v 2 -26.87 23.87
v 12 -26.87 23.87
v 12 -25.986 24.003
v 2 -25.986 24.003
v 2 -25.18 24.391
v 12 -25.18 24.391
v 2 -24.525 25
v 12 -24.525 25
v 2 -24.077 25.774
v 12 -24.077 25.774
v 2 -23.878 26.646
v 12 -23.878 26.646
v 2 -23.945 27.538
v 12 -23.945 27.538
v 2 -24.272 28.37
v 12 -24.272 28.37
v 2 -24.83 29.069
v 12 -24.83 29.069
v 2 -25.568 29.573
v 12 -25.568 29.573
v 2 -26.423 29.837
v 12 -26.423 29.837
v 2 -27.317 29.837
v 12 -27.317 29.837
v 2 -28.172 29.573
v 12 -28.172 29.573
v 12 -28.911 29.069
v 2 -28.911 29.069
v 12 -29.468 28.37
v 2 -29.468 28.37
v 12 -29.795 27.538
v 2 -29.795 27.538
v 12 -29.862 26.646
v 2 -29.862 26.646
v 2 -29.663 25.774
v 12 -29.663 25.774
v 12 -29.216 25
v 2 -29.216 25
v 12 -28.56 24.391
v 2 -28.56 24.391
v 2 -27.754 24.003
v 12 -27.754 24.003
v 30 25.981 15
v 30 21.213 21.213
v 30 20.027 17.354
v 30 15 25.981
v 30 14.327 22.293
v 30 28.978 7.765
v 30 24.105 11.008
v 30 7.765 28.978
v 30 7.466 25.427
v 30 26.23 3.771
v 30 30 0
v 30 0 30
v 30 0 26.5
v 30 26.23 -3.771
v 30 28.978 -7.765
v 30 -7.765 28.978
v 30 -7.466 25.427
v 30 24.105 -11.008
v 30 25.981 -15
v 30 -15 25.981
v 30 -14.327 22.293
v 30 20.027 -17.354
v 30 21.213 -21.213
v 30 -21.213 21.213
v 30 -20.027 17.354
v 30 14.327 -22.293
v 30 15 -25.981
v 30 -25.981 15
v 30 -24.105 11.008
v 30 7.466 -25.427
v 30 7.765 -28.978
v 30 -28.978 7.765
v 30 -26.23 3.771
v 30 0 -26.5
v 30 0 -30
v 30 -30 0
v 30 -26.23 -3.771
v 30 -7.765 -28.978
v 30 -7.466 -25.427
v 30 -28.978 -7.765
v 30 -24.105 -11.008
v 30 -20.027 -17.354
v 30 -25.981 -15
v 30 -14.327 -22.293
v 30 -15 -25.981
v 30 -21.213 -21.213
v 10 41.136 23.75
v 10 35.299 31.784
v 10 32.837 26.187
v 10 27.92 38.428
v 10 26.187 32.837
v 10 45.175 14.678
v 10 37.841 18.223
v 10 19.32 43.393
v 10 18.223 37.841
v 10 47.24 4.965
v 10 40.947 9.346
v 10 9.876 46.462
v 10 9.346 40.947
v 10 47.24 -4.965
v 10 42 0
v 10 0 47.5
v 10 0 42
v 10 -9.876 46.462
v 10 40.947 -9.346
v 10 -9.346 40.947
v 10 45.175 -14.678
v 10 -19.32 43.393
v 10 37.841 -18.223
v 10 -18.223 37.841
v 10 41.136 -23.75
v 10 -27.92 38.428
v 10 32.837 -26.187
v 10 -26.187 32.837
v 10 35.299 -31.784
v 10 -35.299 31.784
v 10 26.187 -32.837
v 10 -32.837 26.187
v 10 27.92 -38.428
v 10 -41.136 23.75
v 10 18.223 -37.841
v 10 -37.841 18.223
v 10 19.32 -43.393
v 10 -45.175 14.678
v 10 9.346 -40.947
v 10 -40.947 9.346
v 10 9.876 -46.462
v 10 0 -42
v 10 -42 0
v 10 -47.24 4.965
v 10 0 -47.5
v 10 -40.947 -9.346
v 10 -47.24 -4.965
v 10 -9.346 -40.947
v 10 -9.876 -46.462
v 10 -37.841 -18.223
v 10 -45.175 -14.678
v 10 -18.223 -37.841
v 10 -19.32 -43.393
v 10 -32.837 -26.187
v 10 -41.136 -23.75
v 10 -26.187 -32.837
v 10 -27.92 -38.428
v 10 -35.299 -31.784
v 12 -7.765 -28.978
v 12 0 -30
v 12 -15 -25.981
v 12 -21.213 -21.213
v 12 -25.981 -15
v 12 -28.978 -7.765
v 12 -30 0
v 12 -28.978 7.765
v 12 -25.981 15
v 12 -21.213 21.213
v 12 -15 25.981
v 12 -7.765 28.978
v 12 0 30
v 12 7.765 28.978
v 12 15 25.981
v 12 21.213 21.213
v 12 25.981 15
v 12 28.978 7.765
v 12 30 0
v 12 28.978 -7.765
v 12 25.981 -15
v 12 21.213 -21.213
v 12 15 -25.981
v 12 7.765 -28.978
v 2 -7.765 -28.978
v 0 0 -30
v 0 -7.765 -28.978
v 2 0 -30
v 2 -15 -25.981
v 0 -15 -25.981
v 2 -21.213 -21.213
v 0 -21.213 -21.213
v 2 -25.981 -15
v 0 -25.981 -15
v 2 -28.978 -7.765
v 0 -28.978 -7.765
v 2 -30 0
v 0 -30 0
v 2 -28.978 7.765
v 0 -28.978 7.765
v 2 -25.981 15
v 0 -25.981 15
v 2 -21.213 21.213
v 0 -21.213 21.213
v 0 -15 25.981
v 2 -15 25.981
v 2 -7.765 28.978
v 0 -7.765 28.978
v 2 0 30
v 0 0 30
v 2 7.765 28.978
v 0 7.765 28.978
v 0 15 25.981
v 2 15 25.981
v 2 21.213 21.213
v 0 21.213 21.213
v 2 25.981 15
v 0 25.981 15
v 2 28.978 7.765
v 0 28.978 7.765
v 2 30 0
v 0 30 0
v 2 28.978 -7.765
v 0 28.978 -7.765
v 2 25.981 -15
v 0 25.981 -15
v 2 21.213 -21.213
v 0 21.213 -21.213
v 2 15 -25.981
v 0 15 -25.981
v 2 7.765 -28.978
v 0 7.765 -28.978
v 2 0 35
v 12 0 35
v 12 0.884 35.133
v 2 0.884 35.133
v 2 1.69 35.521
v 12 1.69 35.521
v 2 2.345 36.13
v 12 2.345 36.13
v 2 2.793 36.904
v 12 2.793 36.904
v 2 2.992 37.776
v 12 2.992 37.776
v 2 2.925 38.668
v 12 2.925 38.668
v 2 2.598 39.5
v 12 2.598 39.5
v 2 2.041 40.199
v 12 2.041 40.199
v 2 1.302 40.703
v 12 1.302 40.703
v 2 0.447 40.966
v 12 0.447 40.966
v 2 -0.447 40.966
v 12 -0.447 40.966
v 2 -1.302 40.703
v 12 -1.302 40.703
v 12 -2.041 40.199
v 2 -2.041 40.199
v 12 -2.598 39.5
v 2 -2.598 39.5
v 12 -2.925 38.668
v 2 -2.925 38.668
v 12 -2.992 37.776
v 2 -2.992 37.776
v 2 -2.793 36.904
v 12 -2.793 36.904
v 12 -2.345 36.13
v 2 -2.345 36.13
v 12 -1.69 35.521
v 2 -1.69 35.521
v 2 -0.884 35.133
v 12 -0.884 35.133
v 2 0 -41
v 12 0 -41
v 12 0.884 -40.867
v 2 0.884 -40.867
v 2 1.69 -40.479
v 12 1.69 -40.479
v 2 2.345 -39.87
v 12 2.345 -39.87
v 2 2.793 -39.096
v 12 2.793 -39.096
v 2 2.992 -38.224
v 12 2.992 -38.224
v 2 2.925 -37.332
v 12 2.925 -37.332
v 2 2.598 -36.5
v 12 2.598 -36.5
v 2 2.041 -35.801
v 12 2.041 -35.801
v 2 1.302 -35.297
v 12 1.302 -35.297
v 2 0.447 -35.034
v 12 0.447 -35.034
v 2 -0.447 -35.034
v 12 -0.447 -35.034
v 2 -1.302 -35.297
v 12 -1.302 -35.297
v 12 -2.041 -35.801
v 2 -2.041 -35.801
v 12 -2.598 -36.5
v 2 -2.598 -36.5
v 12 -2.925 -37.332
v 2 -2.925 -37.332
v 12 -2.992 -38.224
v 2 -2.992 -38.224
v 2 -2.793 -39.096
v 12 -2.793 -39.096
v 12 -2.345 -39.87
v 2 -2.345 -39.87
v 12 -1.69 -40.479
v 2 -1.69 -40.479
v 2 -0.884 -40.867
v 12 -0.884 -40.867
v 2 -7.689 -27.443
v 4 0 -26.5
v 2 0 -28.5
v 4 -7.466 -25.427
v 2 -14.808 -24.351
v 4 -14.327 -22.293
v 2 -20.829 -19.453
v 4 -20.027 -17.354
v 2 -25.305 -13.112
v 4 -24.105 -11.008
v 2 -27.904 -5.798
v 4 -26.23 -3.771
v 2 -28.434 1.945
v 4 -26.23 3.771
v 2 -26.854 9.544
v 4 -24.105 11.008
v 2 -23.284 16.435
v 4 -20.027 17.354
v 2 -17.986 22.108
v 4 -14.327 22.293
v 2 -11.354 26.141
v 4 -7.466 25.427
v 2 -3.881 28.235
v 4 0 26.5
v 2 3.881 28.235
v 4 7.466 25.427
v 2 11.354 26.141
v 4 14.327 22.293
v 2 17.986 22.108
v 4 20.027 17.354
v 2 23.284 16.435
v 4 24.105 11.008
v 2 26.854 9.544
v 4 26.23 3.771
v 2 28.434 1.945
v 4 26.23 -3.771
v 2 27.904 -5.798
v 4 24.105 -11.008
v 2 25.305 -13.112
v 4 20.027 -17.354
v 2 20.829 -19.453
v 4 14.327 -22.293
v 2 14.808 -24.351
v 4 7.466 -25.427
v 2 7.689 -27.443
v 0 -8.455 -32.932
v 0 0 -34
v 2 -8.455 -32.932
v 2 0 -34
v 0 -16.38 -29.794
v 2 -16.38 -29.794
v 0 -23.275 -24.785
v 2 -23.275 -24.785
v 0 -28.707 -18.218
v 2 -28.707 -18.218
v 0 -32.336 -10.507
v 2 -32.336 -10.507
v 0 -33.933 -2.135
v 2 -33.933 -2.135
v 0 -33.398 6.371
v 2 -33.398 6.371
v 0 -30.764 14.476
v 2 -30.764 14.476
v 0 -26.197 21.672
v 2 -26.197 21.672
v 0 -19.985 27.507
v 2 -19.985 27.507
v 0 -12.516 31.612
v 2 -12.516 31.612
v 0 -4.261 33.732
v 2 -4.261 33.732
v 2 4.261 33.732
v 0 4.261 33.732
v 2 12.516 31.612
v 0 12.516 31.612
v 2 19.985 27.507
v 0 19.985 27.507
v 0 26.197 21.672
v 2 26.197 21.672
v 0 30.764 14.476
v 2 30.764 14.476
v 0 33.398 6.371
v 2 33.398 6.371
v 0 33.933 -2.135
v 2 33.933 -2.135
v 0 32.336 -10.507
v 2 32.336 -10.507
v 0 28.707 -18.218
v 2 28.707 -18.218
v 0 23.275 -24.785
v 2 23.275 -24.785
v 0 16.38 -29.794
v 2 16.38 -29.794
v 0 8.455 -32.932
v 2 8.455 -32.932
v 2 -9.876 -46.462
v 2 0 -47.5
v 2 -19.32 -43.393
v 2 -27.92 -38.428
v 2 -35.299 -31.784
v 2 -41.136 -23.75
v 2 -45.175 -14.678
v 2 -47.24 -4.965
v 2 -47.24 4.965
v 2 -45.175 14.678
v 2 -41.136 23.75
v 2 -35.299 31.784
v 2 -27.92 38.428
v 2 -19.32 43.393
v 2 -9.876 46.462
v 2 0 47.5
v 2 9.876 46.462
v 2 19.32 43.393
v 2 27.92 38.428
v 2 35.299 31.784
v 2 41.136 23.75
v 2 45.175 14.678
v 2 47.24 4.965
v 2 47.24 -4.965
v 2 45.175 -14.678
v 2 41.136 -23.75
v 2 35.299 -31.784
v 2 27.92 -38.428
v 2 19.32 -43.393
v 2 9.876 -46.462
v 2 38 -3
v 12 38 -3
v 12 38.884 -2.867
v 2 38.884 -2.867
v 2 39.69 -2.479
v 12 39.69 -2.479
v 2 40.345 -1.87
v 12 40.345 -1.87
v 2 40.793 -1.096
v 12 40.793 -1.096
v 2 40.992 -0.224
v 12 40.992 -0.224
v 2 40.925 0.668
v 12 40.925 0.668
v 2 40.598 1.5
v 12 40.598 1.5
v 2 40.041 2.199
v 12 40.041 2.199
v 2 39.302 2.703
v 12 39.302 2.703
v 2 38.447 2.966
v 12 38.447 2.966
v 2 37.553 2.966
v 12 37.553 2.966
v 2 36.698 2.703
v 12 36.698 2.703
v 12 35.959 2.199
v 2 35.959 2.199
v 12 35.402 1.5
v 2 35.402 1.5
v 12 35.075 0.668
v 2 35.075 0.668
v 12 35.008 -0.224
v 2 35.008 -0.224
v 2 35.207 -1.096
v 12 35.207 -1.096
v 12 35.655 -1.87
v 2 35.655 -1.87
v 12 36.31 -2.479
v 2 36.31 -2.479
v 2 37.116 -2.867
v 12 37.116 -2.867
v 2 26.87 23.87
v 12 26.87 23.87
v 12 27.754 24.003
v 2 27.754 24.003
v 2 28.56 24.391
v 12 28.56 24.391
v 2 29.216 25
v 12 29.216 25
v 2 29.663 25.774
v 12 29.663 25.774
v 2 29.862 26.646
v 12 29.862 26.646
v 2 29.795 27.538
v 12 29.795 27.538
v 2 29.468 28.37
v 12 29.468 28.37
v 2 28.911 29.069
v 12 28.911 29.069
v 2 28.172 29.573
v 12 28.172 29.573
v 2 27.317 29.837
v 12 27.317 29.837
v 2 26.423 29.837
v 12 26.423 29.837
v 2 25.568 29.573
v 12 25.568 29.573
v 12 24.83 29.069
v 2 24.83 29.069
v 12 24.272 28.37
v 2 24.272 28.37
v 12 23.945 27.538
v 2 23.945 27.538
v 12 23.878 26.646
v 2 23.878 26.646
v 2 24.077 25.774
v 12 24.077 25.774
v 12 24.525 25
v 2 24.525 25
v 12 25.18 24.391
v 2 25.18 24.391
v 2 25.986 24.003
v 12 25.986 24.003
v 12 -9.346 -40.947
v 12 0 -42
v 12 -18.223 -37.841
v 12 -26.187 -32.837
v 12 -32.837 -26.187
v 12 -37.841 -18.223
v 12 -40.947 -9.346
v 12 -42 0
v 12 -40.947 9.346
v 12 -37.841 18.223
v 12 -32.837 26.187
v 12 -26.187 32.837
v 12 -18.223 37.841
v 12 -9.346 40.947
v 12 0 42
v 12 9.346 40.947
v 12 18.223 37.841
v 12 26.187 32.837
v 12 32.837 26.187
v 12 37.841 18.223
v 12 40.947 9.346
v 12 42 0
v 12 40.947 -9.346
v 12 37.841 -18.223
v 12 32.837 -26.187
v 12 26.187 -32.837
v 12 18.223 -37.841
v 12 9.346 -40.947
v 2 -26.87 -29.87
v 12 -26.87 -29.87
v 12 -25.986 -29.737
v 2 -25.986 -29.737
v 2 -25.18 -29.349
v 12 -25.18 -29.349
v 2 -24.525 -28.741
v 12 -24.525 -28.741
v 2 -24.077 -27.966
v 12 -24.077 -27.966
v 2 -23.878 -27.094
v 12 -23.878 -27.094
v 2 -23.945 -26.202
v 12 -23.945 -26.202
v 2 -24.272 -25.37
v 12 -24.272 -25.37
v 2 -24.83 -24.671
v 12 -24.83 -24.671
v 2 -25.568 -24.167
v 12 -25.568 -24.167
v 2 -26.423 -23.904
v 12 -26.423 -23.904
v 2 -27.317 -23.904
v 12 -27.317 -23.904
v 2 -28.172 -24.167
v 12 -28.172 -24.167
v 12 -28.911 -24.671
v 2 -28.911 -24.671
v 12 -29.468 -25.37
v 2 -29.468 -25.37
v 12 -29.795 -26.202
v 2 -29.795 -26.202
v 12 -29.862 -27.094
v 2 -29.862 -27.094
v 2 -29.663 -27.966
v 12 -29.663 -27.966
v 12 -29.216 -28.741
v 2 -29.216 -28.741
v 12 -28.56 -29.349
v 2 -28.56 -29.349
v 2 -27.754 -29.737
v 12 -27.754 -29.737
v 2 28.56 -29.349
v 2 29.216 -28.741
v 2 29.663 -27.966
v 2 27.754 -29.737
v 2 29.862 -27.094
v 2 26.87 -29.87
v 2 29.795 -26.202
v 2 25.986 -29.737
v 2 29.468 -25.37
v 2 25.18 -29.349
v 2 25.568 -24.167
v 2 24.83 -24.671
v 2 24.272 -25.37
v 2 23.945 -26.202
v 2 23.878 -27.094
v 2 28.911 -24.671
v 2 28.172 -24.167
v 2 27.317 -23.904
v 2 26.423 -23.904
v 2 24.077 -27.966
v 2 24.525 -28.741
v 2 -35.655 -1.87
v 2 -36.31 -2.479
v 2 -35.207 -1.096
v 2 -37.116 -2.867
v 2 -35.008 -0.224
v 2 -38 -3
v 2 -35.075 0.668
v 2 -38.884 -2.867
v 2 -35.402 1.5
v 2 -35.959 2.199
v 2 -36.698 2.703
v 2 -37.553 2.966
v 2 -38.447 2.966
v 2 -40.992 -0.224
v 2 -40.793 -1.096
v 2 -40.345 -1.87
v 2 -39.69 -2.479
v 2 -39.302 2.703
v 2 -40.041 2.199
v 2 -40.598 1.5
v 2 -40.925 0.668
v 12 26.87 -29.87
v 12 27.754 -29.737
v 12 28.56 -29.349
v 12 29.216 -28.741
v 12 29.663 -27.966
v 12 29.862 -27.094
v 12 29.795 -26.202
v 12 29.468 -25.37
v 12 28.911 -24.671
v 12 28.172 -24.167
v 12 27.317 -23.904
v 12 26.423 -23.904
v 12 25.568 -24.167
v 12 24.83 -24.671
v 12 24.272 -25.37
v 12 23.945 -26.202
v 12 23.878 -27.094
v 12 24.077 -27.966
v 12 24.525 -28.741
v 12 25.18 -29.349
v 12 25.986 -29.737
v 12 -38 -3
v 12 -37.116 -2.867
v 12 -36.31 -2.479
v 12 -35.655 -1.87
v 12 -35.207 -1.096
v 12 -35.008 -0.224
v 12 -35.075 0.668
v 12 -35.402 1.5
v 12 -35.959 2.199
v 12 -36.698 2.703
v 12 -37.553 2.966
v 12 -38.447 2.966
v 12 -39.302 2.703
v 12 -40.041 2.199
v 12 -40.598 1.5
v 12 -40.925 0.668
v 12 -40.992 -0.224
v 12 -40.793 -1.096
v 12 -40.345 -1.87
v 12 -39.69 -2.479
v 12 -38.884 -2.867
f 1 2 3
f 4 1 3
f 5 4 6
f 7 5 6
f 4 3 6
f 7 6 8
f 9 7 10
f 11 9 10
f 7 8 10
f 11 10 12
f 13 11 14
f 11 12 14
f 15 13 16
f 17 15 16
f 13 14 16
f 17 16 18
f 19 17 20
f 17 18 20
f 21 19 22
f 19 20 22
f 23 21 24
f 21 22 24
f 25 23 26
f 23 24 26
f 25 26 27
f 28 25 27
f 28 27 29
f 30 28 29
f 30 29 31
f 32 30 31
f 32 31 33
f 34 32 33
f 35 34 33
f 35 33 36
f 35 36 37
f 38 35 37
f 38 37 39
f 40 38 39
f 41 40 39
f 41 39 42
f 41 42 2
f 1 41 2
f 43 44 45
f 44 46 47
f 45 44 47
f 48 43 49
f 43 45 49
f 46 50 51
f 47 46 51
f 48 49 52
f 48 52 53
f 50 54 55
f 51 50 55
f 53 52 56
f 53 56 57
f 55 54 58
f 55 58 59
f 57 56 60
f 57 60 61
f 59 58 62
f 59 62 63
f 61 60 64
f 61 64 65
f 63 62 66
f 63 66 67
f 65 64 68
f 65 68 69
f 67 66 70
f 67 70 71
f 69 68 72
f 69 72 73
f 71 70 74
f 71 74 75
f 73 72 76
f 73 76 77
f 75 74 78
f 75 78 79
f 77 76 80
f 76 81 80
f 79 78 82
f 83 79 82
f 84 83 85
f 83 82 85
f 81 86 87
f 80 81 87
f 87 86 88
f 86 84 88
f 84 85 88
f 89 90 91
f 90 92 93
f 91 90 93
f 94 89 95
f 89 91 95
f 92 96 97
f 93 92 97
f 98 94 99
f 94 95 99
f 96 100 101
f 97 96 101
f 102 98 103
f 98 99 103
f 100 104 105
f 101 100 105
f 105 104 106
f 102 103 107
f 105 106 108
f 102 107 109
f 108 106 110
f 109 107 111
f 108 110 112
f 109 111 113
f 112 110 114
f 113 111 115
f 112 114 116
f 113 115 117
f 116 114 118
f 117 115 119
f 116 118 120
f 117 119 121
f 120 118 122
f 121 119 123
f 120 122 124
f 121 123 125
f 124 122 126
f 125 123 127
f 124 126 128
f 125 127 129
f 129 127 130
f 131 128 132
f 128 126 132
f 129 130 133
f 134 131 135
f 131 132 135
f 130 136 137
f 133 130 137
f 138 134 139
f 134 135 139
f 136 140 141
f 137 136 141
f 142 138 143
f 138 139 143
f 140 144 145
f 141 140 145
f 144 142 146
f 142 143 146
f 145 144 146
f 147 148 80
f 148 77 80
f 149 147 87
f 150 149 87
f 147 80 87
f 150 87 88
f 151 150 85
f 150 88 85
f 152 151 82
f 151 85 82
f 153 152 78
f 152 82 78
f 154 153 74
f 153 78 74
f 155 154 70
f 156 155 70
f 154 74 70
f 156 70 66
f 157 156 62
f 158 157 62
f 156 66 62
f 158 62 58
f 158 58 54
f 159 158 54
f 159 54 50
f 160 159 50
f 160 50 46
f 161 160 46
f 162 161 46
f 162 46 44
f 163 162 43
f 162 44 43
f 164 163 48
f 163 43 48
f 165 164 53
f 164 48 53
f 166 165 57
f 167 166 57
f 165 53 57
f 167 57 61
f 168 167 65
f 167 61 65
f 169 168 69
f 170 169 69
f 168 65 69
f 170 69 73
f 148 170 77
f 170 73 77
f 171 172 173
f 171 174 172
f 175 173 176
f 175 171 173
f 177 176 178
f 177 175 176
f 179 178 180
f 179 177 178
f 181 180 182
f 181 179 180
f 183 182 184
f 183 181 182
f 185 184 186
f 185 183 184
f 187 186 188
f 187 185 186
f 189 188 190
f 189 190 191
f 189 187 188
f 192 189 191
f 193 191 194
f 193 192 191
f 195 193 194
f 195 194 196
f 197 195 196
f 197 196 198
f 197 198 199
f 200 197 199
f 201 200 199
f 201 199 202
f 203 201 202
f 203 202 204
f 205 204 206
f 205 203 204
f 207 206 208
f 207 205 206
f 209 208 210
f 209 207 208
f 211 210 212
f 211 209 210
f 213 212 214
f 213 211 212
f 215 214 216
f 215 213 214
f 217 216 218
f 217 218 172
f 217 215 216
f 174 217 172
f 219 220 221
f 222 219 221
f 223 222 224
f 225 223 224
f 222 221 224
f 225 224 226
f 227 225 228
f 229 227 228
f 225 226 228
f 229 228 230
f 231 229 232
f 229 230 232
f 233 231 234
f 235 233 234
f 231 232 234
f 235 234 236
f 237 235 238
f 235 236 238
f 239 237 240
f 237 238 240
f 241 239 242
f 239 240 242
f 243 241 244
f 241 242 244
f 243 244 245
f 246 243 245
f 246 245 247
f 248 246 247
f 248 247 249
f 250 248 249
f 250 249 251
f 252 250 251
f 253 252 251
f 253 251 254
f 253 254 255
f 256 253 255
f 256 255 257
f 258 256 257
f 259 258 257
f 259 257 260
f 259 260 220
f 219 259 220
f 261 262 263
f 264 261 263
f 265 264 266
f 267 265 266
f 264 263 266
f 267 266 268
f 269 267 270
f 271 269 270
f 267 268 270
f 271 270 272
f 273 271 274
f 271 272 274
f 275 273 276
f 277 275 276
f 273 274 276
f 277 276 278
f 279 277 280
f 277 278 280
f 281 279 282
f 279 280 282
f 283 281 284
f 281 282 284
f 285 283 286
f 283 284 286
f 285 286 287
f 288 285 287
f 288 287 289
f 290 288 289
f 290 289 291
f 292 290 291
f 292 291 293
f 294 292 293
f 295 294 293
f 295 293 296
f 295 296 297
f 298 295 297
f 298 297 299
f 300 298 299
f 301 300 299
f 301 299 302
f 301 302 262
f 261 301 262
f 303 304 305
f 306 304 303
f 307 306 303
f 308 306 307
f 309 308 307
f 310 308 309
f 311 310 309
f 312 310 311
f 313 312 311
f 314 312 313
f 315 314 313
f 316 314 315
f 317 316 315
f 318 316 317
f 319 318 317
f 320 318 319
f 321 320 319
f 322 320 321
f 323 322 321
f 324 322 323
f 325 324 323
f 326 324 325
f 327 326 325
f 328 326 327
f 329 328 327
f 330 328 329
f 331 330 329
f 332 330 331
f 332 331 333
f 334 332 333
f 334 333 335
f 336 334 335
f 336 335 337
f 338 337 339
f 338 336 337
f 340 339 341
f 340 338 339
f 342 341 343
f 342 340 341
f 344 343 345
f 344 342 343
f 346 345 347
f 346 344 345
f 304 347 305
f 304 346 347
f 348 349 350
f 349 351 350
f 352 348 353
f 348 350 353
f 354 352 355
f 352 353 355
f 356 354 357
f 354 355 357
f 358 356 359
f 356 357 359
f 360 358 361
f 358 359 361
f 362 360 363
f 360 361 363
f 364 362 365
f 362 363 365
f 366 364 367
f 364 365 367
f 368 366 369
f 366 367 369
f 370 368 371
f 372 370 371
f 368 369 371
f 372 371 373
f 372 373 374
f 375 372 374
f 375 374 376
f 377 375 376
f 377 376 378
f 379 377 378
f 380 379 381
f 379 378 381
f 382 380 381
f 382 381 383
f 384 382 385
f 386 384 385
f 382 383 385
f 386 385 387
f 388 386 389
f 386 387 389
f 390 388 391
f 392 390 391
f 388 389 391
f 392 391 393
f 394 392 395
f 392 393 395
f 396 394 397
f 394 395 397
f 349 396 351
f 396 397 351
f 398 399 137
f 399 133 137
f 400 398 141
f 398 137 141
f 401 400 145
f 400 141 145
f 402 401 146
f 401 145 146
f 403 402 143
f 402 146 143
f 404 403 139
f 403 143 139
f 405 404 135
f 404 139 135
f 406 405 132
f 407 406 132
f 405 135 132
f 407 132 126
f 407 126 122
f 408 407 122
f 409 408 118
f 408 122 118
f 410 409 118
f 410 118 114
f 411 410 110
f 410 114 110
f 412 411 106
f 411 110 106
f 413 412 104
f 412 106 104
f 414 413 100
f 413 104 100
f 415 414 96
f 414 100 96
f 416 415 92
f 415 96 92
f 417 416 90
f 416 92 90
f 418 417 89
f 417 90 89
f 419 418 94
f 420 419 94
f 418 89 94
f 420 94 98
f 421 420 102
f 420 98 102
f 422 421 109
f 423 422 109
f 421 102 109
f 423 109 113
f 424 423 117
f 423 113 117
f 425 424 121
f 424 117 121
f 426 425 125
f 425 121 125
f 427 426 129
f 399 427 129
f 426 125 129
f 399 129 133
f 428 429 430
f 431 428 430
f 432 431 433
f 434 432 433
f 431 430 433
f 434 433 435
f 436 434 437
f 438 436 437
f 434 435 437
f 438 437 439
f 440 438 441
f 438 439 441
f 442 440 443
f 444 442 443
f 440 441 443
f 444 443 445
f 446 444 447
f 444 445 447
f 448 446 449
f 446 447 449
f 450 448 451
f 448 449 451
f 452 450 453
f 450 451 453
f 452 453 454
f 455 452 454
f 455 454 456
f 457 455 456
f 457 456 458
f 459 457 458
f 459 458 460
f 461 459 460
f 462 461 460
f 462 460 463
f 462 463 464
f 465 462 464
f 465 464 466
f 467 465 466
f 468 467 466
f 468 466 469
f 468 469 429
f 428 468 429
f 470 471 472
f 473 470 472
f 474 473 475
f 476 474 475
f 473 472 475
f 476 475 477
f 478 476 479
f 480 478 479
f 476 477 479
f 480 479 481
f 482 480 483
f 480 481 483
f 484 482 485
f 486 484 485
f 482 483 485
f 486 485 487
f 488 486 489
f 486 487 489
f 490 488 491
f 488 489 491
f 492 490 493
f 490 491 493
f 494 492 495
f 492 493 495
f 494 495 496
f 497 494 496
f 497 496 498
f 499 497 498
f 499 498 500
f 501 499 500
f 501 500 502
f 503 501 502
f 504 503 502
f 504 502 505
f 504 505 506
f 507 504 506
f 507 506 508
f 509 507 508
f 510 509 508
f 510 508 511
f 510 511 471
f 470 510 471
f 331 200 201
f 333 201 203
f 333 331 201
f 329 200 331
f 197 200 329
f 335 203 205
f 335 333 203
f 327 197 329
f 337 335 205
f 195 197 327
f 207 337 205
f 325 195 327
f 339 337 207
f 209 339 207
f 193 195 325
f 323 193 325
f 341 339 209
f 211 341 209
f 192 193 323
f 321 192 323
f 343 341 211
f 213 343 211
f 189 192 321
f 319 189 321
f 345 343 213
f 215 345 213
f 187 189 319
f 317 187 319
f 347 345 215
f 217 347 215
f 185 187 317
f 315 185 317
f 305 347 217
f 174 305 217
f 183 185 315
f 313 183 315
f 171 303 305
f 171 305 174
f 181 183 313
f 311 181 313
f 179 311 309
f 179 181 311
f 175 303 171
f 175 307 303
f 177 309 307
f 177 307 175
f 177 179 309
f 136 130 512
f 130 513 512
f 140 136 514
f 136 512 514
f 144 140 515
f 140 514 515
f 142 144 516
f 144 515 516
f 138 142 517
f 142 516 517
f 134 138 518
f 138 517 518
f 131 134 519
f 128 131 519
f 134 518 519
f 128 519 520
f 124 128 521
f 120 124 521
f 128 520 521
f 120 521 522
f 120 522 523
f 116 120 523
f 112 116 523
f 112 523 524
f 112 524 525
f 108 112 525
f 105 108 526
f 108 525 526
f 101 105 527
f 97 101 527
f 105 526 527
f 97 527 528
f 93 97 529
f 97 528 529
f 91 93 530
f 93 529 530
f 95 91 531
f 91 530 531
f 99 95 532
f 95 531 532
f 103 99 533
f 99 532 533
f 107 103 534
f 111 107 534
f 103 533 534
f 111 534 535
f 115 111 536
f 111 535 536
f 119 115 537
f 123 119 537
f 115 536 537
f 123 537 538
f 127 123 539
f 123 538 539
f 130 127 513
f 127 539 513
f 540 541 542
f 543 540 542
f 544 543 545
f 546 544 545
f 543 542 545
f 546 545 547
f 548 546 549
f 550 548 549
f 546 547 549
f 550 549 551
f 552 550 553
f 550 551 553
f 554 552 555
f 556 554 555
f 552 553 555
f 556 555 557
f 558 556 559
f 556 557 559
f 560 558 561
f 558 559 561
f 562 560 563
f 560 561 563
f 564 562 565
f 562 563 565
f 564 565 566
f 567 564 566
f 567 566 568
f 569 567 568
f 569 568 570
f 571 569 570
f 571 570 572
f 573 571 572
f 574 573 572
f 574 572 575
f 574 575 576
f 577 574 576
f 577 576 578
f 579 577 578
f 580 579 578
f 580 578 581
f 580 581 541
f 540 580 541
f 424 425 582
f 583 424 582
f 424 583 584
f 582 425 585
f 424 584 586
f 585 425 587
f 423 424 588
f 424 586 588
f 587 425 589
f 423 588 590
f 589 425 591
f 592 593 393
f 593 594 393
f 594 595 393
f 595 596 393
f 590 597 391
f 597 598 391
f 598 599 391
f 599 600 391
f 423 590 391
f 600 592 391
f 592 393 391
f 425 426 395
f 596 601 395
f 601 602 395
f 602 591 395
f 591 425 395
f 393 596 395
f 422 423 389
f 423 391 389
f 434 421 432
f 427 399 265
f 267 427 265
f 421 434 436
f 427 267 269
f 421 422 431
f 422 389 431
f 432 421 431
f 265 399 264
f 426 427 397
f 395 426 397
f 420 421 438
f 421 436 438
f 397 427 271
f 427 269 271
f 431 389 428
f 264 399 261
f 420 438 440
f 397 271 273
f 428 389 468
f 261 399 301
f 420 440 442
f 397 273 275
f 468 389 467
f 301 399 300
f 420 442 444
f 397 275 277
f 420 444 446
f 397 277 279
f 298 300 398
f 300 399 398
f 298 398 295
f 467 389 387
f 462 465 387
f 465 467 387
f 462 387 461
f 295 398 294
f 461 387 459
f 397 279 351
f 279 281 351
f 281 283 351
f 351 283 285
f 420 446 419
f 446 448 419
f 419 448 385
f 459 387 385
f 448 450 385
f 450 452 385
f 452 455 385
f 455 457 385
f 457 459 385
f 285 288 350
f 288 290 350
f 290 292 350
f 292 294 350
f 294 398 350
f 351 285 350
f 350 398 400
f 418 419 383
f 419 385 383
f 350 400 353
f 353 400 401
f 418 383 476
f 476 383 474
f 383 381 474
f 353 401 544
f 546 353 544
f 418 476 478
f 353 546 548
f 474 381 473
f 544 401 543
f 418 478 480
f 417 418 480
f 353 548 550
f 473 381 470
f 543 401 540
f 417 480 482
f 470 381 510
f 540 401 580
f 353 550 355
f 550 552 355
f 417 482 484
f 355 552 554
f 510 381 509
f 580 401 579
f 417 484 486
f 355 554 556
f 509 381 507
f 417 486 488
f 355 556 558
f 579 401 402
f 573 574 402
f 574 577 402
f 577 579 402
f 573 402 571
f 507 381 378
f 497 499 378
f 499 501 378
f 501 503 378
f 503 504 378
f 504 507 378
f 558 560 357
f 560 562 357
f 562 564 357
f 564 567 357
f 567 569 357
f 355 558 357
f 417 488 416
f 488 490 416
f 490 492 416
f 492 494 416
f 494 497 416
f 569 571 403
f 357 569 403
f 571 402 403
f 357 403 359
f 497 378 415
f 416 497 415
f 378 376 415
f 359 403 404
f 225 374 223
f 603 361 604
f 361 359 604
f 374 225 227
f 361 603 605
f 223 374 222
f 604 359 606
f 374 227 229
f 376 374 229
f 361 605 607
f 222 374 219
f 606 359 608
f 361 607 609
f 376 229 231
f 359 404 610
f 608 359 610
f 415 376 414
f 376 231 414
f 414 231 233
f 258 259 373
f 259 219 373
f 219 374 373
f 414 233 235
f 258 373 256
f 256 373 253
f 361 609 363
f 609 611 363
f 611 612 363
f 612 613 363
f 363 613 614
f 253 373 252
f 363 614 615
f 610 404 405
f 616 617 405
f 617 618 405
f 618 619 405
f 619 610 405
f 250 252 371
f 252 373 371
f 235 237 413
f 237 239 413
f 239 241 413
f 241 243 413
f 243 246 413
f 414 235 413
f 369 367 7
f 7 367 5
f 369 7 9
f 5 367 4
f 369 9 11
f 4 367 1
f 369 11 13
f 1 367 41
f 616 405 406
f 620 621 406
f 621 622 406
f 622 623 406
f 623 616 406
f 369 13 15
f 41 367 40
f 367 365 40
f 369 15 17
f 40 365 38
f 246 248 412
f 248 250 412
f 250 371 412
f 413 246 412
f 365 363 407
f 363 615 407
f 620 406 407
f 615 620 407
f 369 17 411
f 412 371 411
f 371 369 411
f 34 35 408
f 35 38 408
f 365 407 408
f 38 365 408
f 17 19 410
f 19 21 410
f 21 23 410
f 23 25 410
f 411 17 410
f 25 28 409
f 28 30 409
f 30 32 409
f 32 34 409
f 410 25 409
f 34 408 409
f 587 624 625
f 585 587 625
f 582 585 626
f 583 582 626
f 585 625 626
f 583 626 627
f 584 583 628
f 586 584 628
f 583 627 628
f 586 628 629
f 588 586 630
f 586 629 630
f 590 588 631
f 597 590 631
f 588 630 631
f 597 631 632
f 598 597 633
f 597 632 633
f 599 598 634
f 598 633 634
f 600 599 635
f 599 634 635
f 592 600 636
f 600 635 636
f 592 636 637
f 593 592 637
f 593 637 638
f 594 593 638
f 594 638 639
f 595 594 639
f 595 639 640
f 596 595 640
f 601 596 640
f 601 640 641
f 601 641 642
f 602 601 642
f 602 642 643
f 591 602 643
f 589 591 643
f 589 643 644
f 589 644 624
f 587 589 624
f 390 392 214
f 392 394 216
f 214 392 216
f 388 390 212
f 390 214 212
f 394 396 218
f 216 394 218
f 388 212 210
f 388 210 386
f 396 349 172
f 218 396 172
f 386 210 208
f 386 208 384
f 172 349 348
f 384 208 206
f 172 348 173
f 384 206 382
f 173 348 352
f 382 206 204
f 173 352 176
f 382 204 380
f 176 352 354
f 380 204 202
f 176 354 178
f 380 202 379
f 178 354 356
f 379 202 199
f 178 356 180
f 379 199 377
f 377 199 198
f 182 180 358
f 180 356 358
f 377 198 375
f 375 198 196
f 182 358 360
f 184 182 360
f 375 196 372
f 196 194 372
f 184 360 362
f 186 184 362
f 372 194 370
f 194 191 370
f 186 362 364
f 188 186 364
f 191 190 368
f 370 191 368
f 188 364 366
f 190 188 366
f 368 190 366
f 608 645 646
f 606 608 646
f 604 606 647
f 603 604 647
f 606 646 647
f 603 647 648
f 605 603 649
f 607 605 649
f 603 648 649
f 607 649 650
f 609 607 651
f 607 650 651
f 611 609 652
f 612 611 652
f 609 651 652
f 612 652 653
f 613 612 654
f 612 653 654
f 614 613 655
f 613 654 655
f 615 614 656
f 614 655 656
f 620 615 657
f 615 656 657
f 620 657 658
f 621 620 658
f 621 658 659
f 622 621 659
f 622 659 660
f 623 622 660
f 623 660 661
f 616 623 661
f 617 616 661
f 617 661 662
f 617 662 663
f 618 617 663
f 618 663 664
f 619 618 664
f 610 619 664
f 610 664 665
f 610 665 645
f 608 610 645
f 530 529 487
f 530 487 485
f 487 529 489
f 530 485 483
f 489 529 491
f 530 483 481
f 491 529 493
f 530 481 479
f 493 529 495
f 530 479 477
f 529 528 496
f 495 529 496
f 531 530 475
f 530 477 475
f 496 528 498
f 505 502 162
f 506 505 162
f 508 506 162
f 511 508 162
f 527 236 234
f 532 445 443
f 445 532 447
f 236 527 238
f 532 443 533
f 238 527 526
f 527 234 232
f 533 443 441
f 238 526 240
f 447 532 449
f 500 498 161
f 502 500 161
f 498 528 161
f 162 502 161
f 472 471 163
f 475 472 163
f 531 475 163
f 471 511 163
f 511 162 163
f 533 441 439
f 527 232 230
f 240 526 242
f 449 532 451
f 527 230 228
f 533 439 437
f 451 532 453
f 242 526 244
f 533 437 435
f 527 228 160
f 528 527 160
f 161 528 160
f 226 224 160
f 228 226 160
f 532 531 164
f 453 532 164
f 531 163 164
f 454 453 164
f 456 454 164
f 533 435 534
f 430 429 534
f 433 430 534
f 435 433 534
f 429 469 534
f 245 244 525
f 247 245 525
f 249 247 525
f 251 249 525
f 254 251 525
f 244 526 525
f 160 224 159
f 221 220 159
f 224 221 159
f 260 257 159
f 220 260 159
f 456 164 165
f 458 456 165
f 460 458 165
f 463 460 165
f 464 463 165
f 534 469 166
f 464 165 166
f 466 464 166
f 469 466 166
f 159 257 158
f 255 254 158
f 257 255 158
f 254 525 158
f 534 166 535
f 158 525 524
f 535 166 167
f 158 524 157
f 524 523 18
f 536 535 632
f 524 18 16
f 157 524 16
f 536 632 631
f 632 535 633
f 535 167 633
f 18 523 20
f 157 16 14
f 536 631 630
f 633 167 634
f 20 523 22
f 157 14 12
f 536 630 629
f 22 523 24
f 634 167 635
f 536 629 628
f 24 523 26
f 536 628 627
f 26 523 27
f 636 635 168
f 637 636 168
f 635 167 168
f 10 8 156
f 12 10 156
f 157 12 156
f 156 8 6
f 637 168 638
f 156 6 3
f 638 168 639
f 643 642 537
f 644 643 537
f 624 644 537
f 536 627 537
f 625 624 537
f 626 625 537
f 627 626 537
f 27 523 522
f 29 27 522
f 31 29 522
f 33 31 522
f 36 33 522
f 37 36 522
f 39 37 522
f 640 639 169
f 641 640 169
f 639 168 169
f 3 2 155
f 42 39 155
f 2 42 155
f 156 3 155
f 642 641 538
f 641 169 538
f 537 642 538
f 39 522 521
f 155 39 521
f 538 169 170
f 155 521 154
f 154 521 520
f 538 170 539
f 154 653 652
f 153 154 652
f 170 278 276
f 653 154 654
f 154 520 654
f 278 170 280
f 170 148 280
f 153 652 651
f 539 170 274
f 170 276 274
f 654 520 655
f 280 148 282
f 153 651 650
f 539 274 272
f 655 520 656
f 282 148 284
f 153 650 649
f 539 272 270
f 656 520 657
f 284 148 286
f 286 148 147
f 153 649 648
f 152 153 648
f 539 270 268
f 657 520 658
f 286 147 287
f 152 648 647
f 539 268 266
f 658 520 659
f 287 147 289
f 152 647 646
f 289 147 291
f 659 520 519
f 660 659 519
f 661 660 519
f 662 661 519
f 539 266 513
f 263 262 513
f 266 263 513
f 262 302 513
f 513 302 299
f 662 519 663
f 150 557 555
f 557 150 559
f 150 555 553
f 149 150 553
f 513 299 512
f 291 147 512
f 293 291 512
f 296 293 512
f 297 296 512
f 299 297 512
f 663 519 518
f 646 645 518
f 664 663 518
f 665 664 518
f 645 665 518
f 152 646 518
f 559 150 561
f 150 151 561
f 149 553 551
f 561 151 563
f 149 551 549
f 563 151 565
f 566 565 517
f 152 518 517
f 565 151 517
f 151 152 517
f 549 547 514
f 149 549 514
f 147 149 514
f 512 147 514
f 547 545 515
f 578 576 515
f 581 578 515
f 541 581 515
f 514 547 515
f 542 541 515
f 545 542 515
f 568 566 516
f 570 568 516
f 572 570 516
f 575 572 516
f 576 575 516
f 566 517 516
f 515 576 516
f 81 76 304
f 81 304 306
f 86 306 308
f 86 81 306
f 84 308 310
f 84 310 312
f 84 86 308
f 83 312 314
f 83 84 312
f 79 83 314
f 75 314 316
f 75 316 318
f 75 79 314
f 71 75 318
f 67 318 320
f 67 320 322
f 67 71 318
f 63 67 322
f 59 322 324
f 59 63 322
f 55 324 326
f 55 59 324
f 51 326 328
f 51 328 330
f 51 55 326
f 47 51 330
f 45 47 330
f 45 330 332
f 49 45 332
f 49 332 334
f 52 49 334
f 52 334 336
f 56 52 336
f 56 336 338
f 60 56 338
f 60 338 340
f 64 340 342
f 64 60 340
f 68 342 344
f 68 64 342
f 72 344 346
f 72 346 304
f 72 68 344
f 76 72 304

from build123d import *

# Parameters (mm, degrees)
CUT_EXTRUDE_1_REACH = 71.545
SKETCH_3_R          = 3
CHAMFER_1_SIZE      = 2


with BuildPart() as part:
    # 草图1 → 旋转1 (revolve)
    with BuildSketch(Plane.XY, mode=Mode.PRIVATE) as revolve_1_sk:
        Polygon((0, 0), (0, 34), (2, 34), (2, 47.5), (10, 47.5), (10, 42), (12, 42), (12, 30), (30, 30), (30, 0), align=None)
    revolve(revolve_1_sk.sketch.rotate(Axis((0, 0, 0), (-1, 0, 0)), 90), axis=Axis((0, 0, 0), (-1, 0, 0)))

    # 草图2 → 切除-旋转1 (revolve, cut)
    with BuildSketch(Plane.XY, mode=Mode.PRIVATE) as cut_revolve_1_sk:
        Polygon((0, 0), (0, 30), (2, 30), (2, 26.5), (30, 26.5), (30, 0), align=None)
    revolve(cut_revolve_1_sk.sketch.rotate(Axis((0, 0, 0), (-1, 0, 0)), 90), axis=Axis((0, 0, 0), (-1, 0, 0)), mode=Mode.SUBTRACT)

    # 草图3 → 切除-拉伸1 (cut, up to next)
    with BuildSketch(Plane(origin=(12, 0, 0), x_dir=(0, 0, -1), z_dir=(1, 0, 0)), mode=Mode.PRIVATE) as cut_extrude_1_sk1:
        with Locations((0, 38)):
            Circle(SKETCH_3_R)
    cut_extrude_1_tool1 = extrude(cut_extrude_1_sk1.sketch, amount=-CUT_EXTRUDE_1_REACH, mode=Mode.PRIVATE) & part.part
    # 草图3 → 切除-拉伸1 (cut, up to next)
    with BuildSketch(Plane(origin=(12, 0, 0), x_dir=(0, 0, -1), z_dir=(1, 0, 0)), mode=Mode.PRIVATE) as cut_extrude_1_sk2:
        with Locations((26.870057685, 26.870057685)):
            Circle(SKETCH_3_R)
    cut_extrude_1_tool2 = extrude(cut_extrude_1_sk2.sketch, amount=-CUT_EXTRUDE_1_REACH, mode=Mode.PRIVATE) & part.part
    # 草图3 → 切除-拉伸1 (cut, up to next)
    with BuildSketch(Plane(origin=(12, 0, 0), x_dir=(0, 0, -1), z_dir=(1, 0, 0)), mode=Mode.PRIVATE) as cut_extrude_1_sk3:
        with Locations((38, 0)):
            Circle(SKETCH_3_R)
    cut_extrude_1_tool3 = extrude(cut_extrude_1_sk3.sketch, amount=-CUT_EXTRUDE_1_REACH, mode=Mode.PRIVATE) & part.part
    # 草图3 → 切除-拉伸1 (cut, up to next)
    with BuildSketch(Plane(origin=(12, 0, 0), x_dir=(0, 0, -1), z_dir=(1, 0, 0)), mode=Mode.PRIVATE) as cut_extrude_1_sk4:
        with Locations((26.870057685, -26.870057685)):
            Circle(SKETCH_3_R)
    cut_extrude_1_tool4 = extrude(cut_extrude_1_sk4.sketch, amount=-CUT_EXTRUDE_1_REACH, mode=Mode.PRIVATE) & part.part
    # 草图3 → 切除-拉伸1 (cut, up to next)
    with BuildSketch(Plane(origin=(12, 0, 0), x_dir=(0, 0, -1), z_dir=(1, 0, 0)), mode=Mode.PRIVATE) as cut_extrude_1_sk5:
        with Locations((0, -38)):
            Circle(SKETCH_3_R)
    cut_extrude_1_tool5 = extrude(cut_extrude_1_sk5.sketch, amount=-CUT_EXTRUDE_1_REACH, mode=Mode.PRIVATE) & part.part
    # 草图3 → 切除-拉伸1 (cut, up to next)
    with BuildSketch(Plane(origin=(12, 0, 0), x_dir=(0, 0, -1), z_dir=(1, 0, 0)), mode=Mode.PRIVATE) as cut_extrude_1_sk6:
        with Locations((-26.870057685, -26.870057685)):
            Circle(SKETCH_3_R)
    cut_extrude_1_tool6 = extrude(cut_extrude_1_sk6.sketch, amount=-CUT_EXTRUDE_1_REACH, mode=Mode.PRIVATE) & part.part
    # 草图3 → 切除-拉伸1 (cut, up to next)
    with BuildSketch(Plane(origin=(12, 0, 0), x_dir=(0, 0, -1), z_dir=(1, 0, 0)), mode=Mode.PRIVATE) as cut_extrude_1_sk7:
        with Locations((-38, 0)):
            Circle(SKETCH_3_R)
    cut_extrude_1_tool7 = extrude(cut_extrude_1_sk7.sketch, amount=-CUT_EXTRUDE_1_REACH, mode=Mode.PRIVATE) & part.part
    # 草图3 → 切除-拉伸1 (cut, up to next)
    with BuildSketch(Plane(origin=(12, 0, 0), x_dir=(0, 0, -1), z_dir=(1, 0, 0)), mode=Mode.PRIVATE) as cut_extrude_1_sk8:
        with Locations((-26.870057685, 26.870057685)):
            Circle(SKETCH_3_R)
    cut_extrude_1_tool8 = extrude(cut_extrude_1_sk8.sketch, amount=-CUT_EXTRUDE_1_REACH, mode=Mode.PRIVATE) & part.part
    add(cut_extrude_1_tool1.solids().sort_by_distance((12, 38, 0))[0], mode=Mode.SUBTRACT)
    add(cut_extrude_1_tool2.solids().sort_by_distance((12, 26.870058, -26.870058))[0], mode=Mode.SUBTRACT)
    add(cut_extrude_1_tool3.solids().sort_by_distance((12, 0, -38))[0], mode=Mode.SUBTRACT)
    add(cut_extrude_1_tool4.solids().sort_by_distance((12, -26.870058, -26.870058))[0], mode=Mode.SUBTRACT)
    add(cut_extrude_1_tool5.solids().sort_by_distance((12, -38, 0))[0], mode=Mode.SUBTRACT)
    add(cut_extrude_1_tool6.solids().sort_by_distance((12, -26.870058, 26.870058))[0], mode=Mode.SUBTRACT)
    add(cut_extrude_1_tool7.solids().sort_by_distance((12, 0, 38))[0], mode=Mode.SUBTRACT)
    add(cut_extrude_1_tool8.solids().sort_by_distance((12, 26.870058, 26.870058))[0], mode=Mode.SUBTRACT)

    # 倒角1
    chamfer_1_edges = [part.edges().sort_by_distance(p)[0] for p in [
        (2, 0, 26.5),
    ]]
    chamfer(chamfer_1_edges, length=CHAMFER_1_SIZE)


solid = part.part
